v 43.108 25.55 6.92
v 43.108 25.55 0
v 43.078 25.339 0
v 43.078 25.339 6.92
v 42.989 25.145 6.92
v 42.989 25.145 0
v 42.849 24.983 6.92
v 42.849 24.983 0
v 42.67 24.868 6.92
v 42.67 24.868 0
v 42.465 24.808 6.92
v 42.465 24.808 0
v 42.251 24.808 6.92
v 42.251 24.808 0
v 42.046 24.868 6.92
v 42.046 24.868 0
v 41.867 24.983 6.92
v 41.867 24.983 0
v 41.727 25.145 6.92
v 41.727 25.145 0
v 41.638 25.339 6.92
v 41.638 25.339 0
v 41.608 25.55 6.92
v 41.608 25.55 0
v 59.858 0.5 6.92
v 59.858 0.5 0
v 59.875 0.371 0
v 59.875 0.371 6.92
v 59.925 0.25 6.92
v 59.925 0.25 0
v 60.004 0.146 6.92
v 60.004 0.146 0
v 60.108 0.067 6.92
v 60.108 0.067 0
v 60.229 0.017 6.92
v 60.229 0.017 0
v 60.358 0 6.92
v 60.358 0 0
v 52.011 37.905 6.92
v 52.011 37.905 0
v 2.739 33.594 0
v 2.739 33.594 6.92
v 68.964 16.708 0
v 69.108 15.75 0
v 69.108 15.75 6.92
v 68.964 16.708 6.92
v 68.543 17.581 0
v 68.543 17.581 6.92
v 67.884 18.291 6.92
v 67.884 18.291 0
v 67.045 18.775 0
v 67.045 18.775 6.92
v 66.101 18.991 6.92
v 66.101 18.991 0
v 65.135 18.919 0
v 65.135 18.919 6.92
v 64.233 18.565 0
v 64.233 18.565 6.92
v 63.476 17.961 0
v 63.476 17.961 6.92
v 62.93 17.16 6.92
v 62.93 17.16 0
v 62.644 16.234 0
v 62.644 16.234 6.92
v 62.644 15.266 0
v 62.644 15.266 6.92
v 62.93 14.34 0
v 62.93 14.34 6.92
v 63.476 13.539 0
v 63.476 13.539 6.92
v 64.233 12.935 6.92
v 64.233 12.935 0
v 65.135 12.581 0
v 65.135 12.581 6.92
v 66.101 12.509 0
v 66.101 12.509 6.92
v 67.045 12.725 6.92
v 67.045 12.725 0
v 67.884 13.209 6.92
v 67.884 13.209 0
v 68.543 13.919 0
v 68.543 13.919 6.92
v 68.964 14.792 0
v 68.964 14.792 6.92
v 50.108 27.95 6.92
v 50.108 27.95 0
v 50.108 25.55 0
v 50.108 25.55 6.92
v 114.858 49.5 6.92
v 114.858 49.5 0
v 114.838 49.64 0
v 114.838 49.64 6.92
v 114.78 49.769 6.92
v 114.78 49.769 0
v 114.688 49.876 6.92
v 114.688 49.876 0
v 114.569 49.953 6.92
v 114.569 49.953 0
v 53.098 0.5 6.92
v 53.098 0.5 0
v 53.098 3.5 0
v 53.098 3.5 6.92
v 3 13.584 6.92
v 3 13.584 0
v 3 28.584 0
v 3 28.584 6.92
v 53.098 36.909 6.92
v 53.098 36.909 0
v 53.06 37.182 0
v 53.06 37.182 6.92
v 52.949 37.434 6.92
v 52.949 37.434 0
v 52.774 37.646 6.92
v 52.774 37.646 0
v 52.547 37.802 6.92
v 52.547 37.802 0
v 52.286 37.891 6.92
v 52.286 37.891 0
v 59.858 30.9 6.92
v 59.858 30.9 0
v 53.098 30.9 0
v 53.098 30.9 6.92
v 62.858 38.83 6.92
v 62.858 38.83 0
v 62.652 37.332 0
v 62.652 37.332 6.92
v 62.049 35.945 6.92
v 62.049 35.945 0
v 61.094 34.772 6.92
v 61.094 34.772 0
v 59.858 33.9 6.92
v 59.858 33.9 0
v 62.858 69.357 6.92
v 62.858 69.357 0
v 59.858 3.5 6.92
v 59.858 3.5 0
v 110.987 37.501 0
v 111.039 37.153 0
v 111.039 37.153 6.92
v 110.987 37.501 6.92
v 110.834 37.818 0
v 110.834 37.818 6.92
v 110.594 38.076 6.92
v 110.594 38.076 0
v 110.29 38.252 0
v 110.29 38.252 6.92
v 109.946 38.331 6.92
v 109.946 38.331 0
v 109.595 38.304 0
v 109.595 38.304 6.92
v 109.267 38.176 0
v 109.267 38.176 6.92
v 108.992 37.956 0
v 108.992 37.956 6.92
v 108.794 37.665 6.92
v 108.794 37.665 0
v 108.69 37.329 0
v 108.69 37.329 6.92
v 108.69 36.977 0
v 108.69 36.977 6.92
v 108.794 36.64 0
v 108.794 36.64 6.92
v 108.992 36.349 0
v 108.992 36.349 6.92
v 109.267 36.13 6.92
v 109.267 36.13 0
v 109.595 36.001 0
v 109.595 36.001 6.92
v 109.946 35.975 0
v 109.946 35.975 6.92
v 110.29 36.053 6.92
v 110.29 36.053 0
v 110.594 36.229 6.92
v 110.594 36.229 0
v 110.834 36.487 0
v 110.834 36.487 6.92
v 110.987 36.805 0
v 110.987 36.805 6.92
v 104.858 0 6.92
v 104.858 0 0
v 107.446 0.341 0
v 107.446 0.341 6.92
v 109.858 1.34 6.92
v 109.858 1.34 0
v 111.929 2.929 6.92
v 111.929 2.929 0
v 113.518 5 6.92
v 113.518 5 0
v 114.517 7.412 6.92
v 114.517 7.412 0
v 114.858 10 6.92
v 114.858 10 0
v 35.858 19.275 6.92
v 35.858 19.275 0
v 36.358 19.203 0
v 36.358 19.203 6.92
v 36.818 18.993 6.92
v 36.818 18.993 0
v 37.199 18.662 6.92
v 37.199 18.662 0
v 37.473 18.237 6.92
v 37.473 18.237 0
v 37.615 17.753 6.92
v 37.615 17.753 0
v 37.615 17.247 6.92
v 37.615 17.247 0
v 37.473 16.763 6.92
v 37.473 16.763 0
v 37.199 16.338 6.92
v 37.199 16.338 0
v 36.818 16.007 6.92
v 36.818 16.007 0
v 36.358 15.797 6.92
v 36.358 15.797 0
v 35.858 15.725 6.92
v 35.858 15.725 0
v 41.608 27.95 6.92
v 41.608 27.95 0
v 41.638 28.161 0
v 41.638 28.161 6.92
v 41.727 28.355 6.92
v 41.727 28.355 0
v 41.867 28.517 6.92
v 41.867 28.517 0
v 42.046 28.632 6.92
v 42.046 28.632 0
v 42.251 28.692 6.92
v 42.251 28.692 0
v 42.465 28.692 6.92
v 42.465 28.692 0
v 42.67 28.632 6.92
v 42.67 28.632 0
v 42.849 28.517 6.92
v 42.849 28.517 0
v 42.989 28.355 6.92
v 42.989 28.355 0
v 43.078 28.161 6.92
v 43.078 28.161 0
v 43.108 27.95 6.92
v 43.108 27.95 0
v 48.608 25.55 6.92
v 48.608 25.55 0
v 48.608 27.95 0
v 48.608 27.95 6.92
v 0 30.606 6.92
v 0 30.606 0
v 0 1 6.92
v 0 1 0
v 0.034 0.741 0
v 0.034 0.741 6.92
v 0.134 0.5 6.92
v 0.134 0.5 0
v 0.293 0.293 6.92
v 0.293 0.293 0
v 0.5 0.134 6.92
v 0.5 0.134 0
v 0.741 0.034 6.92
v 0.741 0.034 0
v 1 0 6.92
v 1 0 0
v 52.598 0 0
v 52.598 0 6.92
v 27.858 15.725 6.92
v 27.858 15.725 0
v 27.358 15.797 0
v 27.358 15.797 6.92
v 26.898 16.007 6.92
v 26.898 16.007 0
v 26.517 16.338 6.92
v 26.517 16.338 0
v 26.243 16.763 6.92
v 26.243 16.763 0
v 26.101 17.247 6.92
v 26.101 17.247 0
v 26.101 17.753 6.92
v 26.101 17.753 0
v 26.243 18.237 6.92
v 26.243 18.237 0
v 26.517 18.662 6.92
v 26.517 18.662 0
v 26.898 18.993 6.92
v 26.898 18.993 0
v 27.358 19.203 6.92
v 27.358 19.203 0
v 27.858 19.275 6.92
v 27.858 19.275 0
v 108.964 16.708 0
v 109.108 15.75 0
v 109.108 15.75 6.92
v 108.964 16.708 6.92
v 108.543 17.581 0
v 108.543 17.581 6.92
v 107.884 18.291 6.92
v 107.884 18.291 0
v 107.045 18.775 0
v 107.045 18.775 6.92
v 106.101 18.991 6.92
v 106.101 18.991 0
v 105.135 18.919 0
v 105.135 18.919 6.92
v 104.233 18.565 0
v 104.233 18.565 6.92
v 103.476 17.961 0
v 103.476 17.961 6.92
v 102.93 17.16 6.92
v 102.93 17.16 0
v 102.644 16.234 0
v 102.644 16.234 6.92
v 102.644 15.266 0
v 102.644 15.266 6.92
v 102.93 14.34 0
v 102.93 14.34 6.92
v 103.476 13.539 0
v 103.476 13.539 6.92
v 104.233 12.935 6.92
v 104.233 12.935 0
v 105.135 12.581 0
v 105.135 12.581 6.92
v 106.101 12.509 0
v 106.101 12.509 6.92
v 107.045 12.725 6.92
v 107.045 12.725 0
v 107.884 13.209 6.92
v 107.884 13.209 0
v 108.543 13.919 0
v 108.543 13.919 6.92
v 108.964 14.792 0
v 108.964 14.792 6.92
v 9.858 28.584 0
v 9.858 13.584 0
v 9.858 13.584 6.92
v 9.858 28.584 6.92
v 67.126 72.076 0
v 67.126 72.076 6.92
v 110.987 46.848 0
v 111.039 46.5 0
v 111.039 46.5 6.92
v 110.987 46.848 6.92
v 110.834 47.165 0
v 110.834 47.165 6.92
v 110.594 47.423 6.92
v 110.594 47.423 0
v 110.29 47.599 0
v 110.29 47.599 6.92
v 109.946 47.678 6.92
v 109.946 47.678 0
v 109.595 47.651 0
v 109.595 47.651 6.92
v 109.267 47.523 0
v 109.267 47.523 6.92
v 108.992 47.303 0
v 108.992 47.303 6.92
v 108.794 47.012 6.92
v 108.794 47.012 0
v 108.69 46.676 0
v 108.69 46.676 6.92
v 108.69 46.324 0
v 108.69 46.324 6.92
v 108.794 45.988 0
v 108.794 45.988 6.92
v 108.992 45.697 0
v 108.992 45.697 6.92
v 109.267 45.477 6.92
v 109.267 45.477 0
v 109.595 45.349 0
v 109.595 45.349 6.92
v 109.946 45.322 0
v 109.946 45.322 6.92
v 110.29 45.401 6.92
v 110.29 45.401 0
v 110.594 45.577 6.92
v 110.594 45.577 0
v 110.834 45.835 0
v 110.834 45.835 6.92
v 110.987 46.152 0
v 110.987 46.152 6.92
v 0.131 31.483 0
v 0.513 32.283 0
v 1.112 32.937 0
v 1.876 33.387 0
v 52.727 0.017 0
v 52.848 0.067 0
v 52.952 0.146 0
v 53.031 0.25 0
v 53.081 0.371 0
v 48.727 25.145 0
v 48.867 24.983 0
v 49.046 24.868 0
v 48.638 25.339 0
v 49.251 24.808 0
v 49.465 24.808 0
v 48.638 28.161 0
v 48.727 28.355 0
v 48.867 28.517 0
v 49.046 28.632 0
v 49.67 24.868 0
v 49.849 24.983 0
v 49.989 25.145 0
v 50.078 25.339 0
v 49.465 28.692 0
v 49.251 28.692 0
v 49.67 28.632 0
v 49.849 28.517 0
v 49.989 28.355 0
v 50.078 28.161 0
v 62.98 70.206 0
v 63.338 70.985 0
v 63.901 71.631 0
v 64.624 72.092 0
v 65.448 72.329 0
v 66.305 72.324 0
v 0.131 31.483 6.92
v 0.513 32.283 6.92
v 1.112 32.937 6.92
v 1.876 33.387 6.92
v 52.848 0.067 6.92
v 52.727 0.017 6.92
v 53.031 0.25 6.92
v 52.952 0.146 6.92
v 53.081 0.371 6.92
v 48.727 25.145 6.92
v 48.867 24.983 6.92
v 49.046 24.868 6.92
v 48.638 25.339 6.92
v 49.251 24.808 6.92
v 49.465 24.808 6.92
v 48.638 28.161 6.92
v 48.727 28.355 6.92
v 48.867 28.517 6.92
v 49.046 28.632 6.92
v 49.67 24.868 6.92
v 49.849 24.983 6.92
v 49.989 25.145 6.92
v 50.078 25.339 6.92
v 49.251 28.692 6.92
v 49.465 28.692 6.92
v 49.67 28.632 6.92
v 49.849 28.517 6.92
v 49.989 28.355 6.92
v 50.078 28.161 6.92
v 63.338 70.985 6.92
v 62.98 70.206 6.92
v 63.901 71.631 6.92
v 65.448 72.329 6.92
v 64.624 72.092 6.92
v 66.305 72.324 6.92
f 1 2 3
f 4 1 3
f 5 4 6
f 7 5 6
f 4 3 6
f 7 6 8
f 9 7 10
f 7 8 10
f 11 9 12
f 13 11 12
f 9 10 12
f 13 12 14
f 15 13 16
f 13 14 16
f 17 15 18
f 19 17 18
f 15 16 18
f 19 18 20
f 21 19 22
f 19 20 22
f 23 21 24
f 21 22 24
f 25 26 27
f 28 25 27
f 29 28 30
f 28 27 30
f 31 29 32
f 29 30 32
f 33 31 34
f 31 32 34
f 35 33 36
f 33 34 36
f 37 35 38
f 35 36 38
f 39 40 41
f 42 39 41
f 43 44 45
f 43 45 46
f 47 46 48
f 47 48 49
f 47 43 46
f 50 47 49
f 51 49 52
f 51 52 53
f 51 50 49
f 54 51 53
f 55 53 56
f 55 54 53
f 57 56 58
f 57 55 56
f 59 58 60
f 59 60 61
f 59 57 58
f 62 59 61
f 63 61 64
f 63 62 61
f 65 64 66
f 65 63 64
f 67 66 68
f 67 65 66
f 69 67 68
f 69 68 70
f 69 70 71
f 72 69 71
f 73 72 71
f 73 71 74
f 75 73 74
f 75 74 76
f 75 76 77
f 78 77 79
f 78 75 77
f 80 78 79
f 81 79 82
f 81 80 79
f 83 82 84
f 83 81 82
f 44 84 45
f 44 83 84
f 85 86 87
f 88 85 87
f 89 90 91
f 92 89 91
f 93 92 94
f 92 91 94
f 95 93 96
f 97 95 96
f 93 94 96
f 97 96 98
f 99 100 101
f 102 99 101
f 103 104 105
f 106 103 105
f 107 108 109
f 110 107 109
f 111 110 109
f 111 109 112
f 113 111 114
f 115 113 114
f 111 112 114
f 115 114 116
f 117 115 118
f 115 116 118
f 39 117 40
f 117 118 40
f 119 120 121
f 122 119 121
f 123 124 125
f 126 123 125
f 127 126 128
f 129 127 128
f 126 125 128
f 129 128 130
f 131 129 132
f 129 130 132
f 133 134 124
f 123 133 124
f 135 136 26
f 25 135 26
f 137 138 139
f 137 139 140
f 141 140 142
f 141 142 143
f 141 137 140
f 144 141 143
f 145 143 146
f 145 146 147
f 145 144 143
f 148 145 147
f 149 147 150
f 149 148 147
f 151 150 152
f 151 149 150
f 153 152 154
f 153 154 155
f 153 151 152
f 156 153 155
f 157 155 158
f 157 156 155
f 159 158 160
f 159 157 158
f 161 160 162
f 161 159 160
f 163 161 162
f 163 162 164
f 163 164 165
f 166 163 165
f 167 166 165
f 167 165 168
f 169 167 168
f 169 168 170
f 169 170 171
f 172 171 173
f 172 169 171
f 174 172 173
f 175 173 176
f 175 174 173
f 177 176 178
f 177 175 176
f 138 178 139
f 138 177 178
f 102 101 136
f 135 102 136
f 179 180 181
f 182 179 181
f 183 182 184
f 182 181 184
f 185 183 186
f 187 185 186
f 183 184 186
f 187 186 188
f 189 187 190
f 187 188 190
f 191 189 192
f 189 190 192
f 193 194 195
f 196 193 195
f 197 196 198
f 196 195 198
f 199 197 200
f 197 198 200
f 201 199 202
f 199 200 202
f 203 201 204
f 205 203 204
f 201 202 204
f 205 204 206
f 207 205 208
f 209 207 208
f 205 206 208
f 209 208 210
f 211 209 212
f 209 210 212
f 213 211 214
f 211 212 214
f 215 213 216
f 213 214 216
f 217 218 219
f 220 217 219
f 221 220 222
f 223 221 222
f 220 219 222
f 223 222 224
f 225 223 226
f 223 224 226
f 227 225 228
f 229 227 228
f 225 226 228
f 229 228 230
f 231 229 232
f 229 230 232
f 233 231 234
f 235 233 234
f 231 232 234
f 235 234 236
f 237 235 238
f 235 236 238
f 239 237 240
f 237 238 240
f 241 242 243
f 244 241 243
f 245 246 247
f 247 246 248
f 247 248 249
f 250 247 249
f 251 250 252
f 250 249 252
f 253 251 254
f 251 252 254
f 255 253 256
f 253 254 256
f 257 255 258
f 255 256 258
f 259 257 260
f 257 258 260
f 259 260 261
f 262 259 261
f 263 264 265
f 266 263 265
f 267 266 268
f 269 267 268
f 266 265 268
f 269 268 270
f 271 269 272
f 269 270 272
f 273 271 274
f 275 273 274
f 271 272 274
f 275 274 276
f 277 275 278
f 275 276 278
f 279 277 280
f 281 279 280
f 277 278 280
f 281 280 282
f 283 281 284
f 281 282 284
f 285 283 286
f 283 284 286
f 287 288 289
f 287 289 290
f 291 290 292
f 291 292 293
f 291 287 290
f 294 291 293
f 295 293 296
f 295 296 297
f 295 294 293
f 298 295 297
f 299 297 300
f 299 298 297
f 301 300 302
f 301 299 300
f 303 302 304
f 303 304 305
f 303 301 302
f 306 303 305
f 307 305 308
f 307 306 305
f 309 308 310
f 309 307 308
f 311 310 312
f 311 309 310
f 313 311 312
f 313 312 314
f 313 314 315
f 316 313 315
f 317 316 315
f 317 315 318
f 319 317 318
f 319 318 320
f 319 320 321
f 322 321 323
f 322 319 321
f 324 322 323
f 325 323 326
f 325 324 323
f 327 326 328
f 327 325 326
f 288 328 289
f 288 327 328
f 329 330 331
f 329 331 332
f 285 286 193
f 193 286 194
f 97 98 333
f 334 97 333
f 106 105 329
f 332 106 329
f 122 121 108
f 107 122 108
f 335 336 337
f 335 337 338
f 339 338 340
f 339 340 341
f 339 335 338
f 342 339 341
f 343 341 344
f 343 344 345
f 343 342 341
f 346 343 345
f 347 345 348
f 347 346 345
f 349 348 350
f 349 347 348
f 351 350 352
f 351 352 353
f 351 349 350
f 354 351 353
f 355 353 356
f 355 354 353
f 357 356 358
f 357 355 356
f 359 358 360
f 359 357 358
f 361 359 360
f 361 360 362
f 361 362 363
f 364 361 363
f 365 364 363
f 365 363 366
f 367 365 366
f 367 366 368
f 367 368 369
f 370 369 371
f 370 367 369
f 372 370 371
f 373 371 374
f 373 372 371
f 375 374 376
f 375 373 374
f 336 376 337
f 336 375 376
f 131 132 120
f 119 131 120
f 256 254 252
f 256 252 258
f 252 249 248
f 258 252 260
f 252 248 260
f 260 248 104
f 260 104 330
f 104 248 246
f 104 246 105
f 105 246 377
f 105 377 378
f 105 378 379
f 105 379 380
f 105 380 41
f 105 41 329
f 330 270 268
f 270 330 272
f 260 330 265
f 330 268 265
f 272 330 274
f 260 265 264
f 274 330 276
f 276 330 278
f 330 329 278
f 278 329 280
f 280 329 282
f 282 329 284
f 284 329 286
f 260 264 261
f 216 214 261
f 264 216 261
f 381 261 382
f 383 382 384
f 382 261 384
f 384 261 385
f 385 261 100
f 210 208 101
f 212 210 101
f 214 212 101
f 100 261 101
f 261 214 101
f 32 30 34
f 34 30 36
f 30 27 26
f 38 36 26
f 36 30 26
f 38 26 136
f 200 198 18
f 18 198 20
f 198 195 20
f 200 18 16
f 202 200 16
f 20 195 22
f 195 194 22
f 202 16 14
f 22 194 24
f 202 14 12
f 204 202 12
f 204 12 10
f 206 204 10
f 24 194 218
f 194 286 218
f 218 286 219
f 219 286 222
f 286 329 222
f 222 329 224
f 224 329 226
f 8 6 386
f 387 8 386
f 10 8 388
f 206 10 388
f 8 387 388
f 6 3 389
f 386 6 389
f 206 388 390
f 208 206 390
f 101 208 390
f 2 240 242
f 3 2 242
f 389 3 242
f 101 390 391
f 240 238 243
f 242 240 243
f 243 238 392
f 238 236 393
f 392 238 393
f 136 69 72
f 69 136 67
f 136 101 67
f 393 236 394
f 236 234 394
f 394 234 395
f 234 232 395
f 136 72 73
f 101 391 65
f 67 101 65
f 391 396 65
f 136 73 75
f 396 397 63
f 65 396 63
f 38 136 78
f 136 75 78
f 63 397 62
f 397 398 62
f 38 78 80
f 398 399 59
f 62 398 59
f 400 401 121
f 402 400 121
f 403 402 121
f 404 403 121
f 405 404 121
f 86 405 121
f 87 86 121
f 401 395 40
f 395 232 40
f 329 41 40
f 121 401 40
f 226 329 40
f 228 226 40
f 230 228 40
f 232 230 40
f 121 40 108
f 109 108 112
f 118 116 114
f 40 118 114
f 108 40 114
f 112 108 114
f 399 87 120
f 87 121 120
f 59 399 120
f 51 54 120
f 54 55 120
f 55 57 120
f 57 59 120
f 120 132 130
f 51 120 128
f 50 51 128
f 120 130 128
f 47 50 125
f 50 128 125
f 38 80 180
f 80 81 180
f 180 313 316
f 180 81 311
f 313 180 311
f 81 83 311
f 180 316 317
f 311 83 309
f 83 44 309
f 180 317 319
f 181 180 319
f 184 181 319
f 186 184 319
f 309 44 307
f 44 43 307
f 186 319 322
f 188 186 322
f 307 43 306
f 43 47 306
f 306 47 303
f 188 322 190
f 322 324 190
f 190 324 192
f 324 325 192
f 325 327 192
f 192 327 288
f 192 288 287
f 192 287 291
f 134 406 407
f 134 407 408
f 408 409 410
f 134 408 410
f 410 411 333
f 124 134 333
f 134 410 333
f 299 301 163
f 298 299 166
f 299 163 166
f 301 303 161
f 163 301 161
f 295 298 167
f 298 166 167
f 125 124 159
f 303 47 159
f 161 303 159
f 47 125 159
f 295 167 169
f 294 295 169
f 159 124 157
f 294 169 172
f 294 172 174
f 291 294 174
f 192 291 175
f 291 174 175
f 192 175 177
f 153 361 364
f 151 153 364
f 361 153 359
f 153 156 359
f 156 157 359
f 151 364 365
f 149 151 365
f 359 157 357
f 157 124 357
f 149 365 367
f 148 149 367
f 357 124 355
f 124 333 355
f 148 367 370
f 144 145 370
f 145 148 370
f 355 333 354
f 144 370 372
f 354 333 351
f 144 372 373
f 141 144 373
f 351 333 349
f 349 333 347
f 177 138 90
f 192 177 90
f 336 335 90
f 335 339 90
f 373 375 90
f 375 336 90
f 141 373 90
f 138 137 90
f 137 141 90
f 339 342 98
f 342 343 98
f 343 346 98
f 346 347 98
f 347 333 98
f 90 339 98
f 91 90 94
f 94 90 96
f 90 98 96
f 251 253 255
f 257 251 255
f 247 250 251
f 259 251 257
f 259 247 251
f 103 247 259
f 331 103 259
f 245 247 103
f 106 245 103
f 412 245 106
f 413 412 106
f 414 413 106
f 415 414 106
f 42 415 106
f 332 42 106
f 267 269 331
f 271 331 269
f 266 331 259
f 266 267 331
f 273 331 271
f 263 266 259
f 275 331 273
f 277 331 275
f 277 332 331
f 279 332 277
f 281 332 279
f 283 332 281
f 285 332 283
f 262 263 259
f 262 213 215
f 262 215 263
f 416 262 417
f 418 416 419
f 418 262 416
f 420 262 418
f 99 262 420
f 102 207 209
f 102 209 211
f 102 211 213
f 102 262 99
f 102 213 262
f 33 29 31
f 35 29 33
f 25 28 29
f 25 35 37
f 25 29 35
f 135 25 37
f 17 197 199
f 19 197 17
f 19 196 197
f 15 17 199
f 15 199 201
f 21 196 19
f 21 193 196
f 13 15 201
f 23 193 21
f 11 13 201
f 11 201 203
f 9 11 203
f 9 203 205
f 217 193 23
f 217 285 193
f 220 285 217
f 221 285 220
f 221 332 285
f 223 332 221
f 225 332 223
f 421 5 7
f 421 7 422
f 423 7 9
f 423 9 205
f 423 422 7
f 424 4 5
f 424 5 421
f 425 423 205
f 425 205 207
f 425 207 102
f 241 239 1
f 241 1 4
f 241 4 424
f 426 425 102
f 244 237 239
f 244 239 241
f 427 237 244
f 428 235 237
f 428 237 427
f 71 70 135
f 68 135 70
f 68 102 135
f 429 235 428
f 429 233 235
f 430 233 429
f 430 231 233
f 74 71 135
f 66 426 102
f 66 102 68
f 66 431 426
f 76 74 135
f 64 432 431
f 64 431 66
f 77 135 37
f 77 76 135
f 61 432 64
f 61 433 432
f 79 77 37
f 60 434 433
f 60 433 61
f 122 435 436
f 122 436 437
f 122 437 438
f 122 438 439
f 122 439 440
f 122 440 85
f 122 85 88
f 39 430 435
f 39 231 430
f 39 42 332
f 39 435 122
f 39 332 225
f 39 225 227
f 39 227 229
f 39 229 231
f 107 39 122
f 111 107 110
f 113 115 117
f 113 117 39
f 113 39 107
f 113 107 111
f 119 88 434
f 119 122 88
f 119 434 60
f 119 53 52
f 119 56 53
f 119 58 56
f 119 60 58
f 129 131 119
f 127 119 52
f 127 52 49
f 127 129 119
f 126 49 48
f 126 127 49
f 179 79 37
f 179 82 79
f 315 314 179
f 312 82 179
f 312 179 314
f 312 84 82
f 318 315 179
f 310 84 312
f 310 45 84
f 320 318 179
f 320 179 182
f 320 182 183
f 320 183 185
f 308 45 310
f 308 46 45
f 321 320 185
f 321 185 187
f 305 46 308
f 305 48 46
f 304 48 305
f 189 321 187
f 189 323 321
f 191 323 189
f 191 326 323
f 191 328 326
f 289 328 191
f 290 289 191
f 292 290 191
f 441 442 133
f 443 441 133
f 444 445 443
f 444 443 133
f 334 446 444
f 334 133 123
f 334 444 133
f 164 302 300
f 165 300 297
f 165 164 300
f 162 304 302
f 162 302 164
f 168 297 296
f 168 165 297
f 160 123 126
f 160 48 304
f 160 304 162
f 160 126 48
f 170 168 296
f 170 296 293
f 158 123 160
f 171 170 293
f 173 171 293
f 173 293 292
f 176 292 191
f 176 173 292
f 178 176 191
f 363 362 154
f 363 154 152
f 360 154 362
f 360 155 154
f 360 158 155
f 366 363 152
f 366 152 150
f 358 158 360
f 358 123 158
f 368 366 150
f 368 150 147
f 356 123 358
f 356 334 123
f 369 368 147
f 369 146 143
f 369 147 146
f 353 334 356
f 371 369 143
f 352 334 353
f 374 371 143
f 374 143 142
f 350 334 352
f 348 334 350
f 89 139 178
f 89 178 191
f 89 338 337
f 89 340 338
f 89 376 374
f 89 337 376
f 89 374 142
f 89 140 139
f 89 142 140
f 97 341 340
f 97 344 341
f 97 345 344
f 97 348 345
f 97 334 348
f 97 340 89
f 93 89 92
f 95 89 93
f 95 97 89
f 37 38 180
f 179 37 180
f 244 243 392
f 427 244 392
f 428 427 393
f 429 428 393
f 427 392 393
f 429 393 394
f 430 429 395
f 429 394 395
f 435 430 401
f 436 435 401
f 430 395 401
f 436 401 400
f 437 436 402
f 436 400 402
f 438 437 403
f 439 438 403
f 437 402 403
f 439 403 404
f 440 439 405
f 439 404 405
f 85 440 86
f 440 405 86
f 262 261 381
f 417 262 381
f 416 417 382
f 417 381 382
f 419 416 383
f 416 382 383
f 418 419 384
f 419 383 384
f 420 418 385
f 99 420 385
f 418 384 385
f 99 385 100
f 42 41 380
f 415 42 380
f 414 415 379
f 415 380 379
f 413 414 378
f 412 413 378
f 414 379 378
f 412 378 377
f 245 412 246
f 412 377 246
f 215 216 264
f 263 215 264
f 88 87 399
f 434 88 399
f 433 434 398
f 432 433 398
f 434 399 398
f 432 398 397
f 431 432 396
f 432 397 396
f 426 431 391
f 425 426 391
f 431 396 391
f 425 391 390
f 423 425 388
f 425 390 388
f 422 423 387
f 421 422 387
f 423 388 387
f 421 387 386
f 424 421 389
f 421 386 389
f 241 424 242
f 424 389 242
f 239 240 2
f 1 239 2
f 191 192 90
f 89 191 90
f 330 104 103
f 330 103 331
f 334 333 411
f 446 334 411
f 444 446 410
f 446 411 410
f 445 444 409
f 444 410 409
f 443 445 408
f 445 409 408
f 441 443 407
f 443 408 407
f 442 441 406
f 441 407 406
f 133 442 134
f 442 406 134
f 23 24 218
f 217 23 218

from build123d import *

# Parameters (mm, degrees)
SKETCH1_R           = 3.25
SKETCH1_R_2         = 1.1811
SKETCH1_W           = 6.858
SKETCH1_H           = 15
BOSS_EXTRUDE1_DEPTH = 6.92


with BuildPart() as part:
    # Sketch1 → Boss-Extrude1 (new body)
    with BuildSketch(Plane.XY):
        with BuildLine():
            Line((114.858, 9.999999315), (114.858, 49.5))
            ThreePointArc((114.858, 49.5), (114.779695723, 49.768649804), (114.569309131, 49.953153894))
            Line((114.569309131, 49.953153894), (67.125854783, 72.07639994))
            ThreePointArc((67.125854783, 72.07639994), (64.246101174, 71.887650915), (62.858, 69.357476578))
            Line((62.858, 69.357476578), (62.858, 38.83025734))
            ThreePointArc((62.858, 38.83025734), (62.049059599, 35.944627537), (59.858, 33.9))
            Line((59.858, 33.9), (59.858, 30.9))
            Line((59.858, 30.9), (53.098, 30.9))
            Line((53.098, 30.9), (53.098, 36.908691499))
            ThreePointArc((53.098, 36.908691499), (52.773590208, 37.645968836), (52.010844257, 37.904886197))
            Line((52.010844257, 37.904886197), (2.738532772, 33.594117516))
            ThreePointArc((2.738532772, 33.594117516), (0.78816799, 32.632304045), (0, 30.605533422))
            Line((0, 30.605533422), (0, 1))
            ThreePointArc((0, 1), (0.292893219, 0.292893219), (1, 0))
            Line((1, 0), (52.598, 0))
            ThreePointArc((52.598, 0), (52.951553391, 0.146446609), (53.098, 0.5))
            Line((53.098, 0.5), (53.098, 3.5))
            Line((53.098, 3.5), (59.858, 3.5))
            Line((59.858, 3.5), (59.858, 0.5))
            ThreePointArc((59.858, 0.5), (60.004446609, 0.146446609), (60.358, 0))
            Line((60.358, 0), (104.858, 0))
            ThreePointArc((104.858, 0), (111.92906757, 2.928931946), (114.858, 9.999999315))
        make_face()
        with Locations((65.858, 15.75)):
            Circle(SKETCH1_R, mode=Mode.SUBTRACT)
        with Locations((105.858, 15.75)):
            Circle(SKETCH1_R, mode=Mode.SUBTRACT)
        with Locations((109.858, 37.1528)):
            Circle(SKETCH1_R_2, mode=Mode.SUBTRACT)
        with Locations((109.858, 46.5)):
            Circle(SKETCH1_R_2, mode=Mode.SUBTRACT)
        with BuildLine():
            Line((50.108, 27.95), (50.108, 25.55))
            ThreePointArc((50.108, 25.55), (49.358, 24.8), (48.608, 25.55))
            Line((48.608, 25.55), (48.608, 27.95))
            ThreePointArc((48.608, 27.95), (49.358, 28.7), (50.108, 27.95))
        make_face(mode=Mode.SUBTRACT)
        with BuildLine():
            Line((43.108, 27.95), (43.108, 25.55))
            ThreePointArc((43.108, 25.55), (42.358, 24.8), (41.608, 25.55))
            Line((41.608, 25.55), (41.608, 27.95))
            ThreePointArc((41.608, 27.95), (42.358, 28.7), (43.108, 27.95))
        make_face(mode=Mode.SUBTRACT)
        with BuildLine():
            Line((35.858, 15.725), (27.858, 15.725))
            ThreePointArc((27.858, 15.725), (26.083, 17.5), (27.858, 19.275))
            Line((27.858, 19.275), (35.858, 19.275))
            ThreePointArc((35.858, 19.275), (37.633, 17.5), (35.858, 15.725))
        make_face(mode=Mode.SUBTRACT)
        with Locations((6.429, 21.084021409)):
            Rectangle(SKETCH1_W, SKETCH1_H, mode=Mode.SUBTRACT)
    extrude(amount=BOSS_EXTRUDE1_DEPTH)


solid = part.part
